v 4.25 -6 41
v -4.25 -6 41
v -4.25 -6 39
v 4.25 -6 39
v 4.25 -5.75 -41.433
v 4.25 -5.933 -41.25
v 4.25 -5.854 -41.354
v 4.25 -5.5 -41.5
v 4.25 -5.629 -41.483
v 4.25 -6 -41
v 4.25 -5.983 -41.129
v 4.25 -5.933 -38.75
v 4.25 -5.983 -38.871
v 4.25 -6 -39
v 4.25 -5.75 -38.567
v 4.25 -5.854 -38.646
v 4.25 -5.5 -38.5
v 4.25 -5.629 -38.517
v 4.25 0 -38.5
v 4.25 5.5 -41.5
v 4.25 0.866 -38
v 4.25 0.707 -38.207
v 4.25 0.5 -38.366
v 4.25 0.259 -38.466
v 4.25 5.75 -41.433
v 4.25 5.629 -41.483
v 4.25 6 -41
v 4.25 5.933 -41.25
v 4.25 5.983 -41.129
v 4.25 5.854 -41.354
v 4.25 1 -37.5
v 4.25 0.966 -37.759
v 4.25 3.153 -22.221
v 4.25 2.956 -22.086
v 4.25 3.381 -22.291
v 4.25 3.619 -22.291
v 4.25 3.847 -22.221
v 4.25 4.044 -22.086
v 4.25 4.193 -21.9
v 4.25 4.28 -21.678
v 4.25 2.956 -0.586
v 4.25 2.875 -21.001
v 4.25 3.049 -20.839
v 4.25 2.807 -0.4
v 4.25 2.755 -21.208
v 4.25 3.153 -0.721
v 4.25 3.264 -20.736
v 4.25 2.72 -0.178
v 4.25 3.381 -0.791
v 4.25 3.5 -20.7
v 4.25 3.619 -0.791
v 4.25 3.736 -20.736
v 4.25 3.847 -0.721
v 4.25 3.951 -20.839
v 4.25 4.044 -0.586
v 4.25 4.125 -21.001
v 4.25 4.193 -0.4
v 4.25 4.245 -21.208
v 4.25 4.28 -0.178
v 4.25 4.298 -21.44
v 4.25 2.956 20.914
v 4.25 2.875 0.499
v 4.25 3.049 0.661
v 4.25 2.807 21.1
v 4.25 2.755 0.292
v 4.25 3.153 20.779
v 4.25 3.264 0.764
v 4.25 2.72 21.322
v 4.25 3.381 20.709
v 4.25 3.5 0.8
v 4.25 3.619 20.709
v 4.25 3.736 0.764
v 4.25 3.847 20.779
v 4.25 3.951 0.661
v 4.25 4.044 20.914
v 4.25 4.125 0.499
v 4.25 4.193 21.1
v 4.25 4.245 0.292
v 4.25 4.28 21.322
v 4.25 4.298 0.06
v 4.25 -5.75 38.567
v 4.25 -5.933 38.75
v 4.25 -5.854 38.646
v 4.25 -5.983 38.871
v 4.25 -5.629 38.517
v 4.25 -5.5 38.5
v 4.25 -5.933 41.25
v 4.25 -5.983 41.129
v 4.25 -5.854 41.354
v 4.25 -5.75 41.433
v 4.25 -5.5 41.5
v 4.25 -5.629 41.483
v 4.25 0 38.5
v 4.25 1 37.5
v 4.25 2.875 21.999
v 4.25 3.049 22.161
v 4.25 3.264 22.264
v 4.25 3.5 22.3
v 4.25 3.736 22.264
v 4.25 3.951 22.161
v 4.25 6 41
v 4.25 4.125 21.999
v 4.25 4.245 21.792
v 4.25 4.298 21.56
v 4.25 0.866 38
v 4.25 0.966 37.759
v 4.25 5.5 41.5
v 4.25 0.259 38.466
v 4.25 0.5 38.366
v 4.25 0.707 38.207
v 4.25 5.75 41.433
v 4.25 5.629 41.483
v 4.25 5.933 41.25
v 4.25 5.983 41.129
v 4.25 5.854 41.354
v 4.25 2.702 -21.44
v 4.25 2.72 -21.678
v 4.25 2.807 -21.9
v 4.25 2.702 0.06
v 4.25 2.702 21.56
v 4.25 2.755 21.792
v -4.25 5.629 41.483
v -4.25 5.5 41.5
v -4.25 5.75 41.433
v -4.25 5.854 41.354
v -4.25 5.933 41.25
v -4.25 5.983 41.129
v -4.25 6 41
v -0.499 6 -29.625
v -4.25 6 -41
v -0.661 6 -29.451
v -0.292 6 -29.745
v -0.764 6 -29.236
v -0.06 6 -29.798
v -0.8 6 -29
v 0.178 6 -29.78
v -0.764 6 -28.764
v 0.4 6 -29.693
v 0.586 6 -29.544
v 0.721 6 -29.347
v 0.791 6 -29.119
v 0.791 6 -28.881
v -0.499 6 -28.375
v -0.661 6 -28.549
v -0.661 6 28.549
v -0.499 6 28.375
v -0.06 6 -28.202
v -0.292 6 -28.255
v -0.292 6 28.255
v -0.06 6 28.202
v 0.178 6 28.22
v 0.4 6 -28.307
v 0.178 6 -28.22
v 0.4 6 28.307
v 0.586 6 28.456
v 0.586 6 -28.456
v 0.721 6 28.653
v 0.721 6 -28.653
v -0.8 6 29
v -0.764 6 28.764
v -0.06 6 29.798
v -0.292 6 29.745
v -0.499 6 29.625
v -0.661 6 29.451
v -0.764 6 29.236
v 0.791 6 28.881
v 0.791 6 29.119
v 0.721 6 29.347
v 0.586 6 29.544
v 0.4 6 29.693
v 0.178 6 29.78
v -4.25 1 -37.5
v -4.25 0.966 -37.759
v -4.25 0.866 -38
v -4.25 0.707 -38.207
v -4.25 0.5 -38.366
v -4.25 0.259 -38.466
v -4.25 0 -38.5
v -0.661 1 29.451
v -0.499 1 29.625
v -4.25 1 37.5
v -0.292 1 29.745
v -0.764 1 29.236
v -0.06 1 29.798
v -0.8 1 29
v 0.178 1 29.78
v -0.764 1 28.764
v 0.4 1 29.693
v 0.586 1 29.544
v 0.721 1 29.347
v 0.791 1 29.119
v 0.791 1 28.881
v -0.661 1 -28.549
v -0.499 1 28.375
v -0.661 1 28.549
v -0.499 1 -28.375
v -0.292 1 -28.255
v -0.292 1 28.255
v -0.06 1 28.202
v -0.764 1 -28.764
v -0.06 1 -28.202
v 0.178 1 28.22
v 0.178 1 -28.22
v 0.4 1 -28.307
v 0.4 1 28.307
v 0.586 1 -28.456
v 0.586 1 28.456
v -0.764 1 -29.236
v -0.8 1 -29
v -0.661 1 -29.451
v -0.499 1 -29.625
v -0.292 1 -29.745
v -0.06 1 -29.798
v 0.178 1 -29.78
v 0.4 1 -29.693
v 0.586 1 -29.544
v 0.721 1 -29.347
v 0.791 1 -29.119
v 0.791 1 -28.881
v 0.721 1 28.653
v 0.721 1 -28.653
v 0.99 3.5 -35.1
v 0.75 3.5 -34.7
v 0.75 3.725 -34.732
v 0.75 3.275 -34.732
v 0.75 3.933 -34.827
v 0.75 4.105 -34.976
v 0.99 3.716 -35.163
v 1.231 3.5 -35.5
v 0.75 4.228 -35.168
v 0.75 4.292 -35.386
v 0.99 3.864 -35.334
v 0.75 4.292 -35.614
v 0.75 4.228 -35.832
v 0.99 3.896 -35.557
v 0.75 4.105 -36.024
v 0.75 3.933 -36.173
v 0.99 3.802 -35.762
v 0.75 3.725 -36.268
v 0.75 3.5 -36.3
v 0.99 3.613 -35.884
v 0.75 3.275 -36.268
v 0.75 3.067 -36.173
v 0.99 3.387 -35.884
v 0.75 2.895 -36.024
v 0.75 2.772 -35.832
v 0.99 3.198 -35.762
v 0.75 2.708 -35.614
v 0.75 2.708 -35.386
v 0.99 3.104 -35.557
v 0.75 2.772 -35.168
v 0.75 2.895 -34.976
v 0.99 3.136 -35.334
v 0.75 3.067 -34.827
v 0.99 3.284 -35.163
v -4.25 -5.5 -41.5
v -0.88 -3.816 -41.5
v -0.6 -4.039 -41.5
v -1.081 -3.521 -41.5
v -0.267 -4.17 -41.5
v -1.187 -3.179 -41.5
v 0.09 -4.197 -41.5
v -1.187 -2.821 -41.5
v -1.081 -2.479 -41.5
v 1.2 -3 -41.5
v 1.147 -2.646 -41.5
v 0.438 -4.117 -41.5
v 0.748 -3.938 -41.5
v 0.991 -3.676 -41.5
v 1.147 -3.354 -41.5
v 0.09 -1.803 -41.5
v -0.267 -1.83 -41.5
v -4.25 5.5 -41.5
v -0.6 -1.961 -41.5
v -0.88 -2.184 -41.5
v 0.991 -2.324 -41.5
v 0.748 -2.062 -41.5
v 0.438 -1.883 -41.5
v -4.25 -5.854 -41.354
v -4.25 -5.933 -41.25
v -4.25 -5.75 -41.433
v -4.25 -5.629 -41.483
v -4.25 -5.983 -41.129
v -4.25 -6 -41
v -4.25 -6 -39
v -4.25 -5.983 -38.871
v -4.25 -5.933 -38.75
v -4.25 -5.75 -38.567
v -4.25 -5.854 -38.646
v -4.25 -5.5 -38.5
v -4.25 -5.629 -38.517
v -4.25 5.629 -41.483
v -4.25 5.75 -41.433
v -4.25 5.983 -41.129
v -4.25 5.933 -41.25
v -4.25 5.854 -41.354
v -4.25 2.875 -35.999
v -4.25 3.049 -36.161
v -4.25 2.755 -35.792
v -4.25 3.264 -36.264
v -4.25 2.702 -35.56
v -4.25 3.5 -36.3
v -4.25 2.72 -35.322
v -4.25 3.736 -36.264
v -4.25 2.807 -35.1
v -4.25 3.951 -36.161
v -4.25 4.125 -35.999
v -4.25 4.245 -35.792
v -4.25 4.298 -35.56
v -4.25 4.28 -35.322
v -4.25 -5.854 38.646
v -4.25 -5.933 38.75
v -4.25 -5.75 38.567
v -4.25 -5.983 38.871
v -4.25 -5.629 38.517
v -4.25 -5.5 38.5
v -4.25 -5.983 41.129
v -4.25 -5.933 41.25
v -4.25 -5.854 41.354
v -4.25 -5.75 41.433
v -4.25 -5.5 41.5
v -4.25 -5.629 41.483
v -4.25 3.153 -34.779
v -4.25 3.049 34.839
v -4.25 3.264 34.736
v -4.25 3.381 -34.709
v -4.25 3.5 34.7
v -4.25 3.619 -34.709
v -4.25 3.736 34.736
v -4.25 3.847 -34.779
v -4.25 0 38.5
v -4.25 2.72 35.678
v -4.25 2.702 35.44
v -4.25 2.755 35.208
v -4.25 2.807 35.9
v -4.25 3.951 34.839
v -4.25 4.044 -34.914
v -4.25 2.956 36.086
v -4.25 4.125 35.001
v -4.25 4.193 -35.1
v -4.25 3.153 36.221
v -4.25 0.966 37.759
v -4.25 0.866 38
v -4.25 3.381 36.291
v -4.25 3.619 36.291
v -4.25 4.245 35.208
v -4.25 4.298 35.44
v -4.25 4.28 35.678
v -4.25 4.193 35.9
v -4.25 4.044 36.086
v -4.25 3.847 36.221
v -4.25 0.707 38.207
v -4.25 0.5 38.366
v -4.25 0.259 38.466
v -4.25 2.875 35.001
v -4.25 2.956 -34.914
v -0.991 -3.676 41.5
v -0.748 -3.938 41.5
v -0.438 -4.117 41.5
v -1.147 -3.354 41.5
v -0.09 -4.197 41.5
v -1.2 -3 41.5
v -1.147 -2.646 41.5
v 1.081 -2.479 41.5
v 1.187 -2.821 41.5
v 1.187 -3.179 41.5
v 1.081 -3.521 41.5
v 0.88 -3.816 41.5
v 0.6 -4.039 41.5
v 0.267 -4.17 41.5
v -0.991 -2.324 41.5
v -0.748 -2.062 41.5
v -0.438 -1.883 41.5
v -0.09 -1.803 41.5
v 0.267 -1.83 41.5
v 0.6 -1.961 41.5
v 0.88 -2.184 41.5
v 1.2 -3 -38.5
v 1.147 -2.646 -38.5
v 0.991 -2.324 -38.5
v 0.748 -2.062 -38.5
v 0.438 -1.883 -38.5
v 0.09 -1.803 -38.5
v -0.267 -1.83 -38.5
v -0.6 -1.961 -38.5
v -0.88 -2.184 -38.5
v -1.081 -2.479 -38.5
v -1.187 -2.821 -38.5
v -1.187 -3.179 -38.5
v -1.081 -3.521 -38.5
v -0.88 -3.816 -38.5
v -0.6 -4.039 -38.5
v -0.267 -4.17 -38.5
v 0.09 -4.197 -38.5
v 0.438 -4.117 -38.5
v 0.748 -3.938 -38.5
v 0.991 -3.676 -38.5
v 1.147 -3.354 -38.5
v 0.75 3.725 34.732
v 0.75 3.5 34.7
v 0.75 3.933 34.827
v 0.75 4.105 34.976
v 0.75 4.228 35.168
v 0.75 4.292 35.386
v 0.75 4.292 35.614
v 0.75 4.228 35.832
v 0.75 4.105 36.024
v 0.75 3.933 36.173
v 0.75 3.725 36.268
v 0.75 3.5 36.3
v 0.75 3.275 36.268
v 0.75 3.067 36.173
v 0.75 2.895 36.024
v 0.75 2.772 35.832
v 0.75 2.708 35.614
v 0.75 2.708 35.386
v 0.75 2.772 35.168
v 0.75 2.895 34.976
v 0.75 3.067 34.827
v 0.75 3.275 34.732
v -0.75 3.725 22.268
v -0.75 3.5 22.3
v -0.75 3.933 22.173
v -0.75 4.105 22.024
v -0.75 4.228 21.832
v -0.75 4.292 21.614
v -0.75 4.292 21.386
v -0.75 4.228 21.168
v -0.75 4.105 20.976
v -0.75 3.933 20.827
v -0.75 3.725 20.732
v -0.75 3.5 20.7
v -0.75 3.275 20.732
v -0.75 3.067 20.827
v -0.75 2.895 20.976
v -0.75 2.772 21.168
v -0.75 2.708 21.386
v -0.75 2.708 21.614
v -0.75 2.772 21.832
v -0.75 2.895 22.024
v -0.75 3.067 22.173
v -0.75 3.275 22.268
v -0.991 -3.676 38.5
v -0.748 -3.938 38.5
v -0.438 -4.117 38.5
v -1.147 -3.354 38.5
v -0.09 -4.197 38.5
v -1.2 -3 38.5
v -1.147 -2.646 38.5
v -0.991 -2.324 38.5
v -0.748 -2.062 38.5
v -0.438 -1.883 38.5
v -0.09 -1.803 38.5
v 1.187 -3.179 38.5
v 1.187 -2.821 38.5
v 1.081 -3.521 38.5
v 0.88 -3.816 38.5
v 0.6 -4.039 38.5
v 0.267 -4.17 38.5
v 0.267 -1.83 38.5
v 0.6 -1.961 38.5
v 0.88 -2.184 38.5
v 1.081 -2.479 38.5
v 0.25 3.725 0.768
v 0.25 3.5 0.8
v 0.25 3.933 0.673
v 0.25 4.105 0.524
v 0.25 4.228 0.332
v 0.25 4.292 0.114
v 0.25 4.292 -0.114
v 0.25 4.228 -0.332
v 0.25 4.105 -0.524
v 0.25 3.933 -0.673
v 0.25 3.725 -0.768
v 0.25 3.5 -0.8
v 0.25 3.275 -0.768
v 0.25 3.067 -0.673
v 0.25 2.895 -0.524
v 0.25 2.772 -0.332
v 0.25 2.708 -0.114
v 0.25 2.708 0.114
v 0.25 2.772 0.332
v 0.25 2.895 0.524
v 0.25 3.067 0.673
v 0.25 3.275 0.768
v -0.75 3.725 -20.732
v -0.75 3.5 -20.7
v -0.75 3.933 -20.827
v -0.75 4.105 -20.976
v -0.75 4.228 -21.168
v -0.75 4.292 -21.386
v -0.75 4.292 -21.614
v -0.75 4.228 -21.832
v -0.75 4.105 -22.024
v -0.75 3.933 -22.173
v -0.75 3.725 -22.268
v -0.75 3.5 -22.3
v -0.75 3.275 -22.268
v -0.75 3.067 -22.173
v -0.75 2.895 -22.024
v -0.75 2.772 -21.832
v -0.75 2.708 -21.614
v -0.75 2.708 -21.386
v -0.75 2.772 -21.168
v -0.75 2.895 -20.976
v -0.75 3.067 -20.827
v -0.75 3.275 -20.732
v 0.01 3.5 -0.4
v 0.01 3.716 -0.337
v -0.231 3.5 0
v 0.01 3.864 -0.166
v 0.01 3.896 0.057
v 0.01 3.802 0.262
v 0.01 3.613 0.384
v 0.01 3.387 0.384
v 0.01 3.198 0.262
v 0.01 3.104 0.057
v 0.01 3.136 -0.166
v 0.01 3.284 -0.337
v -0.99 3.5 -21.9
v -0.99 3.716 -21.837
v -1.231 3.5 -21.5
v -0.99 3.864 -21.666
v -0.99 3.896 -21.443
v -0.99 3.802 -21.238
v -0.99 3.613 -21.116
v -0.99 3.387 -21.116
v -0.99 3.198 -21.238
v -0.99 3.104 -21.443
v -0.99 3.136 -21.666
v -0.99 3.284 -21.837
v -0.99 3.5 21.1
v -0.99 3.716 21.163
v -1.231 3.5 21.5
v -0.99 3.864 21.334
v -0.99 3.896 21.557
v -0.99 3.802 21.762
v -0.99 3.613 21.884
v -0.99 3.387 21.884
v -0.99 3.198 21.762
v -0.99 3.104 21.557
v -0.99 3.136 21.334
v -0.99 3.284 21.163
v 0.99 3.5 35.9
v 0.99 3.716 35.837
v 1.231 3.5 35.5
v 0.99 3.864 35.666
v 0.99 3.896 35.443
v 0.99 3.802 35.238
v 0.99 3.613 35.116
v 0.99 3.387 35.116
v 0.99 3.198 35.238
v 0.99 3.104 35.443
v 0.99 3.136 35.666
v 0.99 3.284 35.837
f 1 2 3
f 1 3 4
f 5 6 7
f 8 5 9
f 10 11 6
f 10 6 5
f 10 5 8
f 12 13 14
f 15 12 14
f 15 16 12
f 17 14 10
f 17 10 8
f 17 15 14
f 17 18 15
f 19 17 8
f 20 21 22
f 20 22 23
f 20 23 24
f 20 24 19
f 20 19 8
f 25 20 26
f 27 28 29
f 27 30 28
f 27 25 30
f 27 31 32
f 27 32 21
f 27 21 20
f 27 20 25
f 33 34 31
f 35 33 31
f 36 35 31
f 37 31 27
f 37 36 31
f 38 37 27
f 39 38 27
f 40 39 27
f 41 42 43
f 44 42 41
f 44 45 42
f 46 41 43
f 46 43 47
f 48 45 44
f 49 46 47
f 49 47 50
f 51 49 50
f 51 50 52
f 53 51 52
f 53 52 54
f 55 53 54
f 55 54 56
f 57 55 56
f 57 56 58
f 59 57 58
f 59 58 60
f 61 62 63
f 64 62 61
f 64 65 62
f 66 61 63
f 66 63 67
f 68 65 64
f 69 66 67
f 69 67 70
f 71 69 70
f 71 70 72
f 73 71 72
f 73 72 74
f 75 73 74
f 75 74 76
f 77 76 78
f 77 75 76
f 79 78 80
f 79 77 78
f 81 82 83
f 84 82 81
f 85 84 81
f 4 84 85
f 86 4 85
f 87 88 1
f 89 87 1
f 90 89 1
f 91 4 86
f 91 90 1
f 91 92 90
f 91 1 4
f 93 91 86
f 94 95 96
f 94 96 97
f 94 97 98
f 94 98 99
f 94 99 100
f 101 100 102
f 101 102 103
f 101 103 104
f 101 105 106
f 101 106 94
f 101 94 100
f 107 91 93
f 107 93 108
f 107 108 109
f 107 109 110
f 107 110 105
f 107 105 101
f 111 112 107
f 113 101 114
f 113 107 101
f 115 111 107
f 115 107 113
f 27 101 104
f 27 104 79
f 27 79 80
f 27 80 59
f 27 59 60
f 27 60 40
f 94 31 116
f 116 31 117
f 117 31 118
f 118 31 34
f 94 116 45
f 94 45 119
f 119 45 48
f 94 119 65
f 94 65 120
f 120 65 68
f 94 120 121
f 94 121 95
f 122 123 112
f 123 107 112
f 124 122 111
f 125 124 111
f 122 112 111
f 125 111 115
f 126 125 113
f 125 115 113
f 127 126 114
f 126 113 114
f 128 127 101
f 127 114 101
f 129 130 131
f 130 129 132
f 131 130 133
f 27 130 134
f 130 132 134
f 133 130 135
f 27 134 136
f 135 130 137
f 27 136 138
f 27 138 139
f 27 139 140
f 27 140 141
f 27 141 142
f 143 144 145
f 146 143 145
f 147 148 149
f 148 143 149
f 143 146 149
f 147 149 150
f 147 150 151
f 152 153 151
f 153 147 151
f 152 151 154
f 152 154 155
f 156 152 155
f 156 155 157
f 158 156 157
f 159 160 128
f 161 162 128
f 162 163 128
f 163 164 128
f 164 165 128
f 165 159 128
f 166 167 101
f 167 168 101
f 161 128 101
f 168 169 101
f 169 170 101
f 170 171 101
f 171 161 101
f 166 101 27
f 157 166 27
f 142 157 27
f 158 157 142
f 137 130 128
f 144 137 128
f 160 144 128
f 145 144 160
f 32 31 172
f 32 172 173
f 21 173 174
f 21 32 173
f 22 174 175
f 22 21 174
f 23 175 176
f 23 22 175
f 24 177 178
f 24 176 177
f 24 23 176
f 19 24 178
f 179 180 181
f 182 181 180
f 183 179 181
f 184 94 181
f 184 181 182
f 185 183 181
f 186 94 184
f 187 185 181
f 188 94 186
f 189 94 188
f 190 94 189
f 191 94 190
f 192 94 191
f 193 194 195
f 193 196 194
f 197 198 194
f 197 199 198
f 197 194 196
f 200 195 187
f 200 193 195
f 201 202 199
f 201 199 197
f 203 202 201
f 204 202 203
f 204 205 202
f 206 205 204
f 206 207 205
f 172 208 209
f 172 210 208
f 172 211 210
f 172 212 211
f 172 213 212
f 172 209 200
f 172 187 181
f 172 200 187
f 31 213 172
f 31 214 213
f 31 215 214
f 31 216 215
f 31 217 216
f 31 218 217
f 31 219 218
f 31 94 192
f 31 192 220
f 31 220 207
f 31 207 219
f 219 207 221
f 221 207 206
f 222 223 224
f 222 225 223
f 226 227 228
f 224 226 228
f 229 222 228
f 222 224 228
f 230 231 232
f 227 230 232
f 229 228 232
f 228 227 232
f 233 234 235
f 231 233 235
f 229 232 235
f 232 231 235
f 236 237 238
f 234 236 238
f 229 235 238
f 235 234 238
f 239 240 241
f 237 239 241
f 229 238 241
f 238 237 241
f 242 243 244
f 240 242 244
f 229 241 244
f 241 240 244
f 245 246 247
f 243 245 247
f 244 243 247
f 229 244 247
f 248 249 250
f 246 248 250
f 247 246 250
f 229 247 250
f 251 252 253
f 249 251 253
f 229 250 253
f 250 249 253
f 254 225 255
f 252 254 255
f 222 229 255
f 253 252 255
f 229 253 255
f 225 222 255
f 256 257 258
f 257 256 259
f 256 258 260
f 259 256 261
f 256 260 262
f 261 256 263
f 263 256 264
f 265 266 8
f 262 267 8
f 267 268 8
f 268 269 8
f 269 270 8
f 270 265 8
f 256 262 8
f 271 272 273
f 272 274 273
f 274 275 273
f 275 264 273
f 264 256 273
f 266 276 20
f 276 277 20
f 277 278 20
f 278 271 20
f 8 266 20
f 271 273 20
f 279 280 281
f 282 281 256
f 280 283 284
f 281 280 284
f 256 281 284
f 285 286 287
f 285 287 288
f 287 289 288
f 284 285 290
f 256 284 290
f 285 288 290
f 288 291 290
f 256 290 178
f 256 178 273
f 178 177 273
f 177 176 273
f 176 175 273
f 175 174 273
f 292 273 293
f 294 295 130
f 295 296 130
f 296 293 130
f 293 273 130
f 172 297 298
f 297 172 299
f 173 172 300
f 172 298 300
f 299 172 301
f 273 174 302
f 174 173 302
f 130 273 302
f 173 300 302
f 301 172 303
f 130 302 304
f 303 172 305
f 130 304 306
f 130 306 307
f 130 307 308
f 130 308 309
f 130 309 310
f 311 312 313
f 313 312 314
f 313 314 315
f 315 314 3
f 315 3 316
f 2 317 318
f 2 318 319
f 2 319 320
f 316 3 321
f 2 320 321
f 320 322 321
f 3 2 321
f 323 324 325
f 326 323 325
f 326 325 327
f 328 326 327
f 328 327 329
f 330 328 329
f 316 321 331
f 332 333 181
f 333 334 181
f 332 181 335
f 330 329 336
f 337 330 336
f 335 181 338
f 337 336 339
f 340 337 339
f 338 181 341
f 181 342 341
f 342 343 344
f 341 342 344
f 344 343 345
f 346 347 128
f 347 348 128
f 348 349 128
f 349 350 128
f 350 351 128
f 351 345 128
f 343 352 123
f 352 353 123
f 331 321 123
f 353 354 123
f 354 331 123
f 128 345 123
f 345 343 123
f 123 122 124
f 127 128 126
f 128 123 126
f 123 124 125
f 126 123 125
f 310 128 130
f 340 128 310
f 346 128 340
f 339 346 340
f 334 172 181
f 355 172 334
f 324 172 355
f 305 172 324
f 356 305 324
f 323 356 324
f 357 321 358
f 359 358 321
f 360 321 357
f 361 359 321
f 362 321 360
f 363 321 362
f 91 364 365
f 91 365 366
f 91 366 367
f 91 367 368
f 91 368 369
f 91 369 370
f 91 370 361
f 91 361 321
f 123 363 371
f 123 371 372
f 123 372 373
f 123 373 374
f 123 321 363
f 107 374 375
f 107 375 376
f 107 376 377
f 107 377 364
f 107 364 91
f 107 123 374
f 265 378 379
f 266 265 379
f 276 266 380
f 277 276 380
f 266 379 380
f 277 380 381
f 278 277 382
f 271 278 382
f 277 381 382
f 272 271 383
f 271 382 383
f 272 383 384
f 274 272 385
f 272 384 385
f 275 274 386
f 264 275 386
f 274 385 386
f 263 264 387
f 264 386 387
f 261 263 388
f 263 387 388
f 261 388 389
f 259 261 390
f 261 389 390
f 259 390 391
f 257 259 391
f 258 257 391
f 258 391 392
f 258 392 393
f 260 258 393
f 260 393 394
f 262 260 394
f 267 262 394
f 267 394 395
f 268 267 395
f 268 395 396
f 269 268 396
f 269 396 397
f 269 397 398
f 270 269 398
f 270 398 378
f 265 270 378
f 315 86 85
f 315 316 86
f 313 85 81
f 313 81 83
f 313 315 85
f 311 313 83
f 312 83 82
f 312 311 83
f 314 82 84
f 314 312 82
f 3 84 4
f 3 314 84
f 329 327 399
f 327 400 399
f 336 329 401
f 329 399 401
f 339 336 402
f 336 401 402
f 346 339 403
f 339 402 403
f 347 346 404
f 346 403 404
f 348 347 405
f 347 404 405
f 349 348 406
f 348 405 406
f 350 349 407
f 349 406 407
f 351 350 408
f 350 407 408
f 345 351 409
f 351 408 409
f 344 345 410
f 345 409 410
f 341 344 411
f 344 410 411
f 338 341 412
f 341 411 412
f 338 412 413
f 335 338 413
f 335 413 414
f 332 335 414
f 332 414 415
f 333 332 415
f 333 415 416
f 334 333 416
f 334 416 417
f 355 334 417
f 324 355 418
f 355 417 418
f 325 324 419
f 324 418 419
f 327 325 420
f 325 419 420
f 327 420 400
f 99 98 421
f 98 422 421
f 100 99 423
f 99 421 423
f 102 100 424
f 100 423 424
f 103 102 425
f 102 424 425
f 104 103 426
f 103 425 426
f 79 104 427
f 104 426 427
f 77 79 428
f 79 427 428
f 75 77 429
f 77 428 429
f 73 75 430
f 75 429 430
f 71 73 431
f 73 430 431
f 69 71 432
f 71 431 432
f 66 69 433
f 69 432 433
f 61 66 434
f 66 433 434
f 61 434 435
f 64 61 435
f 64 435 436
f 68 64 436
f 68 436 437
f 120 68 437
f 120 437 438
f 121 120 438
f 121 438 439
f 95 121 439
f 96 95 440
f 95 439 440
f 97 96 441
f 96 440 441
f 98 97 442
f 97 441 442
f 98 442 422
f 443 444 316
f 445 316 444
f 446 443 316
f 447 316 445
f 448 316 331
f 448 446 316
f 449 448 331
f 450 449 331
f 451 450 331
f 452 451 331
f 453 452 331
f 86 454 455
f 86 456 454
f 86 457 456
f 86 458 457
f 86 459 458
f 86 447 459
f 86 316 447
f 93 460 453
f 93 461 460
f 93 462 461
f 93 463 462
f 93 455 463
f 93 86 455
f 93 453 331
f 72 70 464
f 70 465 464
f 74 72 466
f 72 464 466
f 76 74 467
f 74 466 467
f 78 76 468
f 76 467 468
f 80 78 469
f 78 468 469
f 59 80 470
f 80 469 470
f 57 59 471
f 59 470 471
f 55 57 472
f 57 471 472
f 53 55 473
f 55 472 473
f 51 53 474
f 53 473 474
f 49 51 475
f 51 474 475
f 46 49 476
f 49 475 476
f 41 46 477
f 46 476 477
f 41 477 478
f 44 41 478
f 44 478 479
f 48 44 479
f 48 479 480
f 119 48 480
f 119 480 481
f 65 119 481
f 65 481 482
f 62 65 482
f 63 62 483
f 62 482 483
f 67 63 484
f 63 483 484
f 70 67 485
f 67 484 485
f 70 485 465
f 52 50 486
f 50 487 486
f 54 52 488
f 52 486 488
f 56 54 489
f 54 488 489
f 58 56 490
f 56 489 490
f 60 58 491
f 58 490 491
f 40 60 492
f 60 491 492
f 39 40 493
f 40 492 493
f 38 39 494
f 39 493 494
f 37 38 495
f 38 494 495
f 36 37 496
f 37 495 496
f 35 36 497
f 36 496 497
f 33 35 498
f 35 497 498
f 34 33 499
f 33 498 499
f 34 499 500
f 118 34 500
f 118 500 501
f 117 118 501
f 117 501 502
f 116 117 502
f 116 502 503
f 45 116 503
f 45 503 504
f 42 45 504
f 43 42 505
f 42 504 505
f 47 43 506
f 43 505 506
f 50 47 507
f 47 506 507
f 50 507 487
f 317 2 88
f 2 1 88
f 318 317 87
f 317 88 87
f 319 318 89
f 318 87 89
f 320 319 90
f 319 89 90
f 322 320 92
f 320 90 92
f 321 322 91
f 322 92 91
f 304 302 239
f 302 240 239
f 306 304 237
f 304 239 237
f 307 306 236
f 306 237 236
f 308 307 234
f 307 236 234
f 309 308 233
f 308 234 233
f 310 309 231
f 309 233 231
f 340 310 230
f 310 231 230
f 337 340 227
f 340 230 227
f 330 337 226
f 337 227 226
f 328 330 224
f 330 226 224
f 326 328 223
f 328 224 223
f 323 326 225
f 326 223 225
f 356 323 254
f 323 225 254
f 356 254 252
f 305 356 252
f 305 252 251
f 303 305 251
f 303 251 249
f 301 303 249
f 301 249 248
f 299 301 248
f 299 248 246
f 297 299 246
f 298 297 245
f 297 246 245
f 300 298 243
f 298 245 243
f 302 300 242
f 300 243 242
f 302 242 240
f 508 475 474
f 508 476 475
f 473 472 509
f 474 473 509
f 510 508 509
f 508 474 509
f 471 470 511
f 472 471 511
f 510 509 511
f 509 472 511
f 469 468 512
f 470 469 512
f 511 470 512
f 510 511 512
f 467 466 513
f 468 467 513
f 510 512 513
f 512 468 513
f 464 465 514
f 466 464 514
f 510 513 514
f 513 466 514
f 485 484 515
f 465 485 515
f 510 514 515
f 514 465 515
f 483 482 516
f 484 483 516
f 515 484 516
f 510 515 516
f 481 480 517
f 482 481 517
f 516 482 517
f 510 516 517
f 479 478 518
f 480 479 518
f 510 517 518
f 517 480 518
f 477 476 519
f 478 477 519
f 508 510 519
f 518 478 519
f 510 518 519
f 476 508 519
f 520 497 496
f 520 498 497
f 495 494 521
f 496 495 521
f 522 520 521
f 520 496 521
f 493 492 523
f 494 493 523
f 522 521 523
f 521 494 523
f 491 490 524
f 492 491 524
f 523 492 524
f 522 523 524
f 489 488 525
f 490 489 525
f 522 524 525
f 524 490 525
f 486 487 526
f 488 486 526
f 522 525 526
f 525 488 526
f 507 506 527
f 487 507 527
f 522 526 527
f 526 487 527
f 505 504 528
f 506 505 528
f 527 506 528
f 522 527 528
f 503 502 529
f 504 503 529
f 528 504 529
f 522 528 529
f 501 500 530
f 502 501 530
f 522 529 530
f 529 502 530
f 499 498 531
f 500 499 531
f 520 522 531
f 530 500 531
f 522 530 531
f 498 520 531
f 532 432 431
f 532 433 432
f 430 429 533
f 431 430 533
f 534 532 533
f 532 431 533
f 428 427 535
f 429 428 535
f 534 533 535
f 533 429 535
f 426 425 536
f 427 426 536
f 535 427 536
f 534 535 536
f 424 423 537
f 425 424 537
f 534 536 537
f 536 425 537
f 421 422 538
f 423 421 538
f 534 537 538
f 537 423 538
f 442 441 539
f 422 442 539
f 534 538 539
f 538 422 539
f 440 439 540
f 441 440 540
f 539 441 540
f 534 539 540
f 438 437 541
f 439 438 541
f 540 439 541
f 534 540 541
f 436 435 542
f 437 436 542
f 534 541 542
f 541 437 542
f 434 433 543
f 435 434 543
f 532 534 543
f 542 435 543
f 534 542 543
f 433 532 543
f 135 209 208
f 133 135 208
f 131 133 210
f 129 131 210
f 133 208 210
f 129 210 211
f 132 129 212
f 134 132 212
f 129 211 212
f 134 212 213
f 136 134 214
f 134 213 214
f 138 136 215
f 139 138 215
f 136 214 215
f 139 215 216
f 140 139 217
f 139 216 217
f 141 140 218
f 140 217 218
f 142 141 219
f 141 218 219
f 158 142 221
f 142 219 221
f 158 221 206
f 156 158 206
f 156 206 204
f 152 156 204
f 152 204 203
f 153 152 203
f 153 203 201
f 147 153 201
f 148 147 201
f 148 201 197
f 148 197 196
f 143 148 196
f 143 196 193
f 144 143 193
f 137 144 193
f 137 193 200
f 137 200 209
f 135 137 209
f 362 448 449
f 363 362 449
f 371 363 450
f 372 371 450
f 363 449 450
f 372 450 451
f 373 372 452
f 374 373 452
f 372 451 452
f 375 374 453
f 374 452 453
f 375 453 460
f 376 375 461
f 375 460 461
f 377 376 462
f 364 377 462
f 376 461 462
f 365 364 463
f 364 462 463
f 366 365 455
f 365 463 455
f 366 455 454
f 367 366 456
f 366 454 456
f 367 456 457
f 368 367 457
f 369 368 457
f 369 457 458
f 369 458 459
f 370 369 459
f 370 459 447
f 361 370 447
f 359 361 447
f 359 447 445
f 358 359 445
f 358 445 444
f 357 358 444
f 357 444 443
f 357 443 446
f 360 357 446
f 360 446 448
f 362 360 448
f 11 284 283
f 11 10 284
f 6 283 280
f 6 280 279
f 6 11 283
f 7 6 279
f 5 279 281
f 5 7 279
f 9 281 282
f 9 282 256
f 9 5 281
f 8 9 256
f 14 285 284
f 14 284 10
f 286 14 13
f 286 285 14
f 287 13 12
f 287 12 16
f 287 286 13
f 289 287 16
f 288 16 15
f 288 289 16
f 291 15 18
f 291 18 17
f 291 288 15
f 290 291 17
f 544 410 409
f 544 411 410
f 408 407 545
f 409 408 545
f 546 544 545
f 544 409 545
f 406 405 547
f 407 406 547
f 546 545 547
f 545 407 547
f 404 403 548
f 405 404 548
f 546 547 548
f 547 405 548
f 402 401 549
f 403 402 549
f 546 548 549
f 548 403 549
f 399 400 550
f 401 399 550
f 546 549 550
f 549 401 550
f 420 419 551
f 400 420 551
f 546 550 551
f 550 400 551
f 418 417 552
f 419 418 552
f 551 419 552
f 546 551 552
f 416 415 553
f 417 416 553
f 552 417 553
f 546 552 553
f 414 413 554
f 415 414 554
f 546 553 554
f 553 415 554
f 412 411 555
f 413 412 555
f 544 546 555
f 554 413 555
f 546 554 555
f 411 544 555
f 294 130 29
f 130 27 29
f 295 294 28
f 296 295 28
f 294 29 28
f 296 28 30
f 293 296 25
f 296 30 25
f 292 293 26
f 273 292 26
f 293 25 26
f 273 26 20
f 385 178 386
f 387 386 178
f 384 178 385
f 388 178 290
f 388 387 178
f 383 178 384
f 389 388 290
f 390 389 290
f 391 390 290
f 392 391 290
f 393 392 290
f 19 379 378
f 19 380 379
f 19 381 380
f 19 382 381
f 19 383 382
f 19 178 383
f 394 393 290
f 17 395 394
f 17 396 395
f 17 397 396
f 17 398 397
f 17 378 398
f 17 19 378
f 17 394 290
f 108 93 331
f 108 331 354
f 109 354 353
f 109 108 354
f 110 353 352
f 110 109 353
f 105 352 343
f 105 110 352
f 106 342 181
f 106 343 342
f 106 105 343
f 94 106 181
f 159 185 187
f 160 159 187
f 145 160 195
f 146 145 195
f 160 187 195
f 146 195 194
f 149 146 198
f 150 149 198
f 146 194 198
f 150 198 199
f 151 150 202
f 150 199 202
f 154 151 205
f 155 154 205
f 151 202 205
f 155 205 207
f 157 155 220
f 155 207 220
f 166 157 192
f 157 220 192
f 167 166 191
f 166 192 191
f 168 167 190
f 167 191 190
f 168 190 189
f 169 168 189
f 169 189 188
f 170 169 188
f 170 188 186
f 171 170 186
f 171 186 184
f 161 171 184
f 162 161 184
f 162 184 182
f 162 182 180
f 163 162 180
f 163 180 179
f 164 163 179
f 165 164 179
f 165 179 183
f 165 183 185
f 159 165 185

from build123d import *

# Parameters (mm, degrees)
SKETCH1_W           = 8.5
SKETCH1_H           = 12
BOSS_EXTRUDE1_DEPTH = 41.5
CUT_EXTRUDE1_DEPTH  = 43.784342931
FILLET1_R           = 0.5
M2_HOLE1_R_D        = 1.6
M2_HOLE1_R_DEPTH    = 5
M2_HOLE1_R_TIP      = 0.480688495
M2_HOLE2_T_D        = 1.6
M2_HOLE2_T_DEPTH    = 4
M2_HOLE2_T_TIP      = 0.480688495
M2_HOLE3_U_D        = 2.4
M2_HOLE3_U_DEPTH    = 10
M2_HOLE3_U_TIP      = 0.721032743
M2_HOLE4_V_D        = 1.6
M2_HOLE5_W_D        = 1.6
M2_HOLE5_W_DEPTH    = 5
M2_HOLE5_W_TIP      = 0.480688495
M2_HOLE6_Y_D        = 2.4
M2_HOLE6_Y_DEPTH    = 10
M2_HOLE6_Y_TIP      = 0.721032743


with BuildPart() as part:
    # Sketch1 → Boss-Extrude1 (new, symmetric)
    with BuildSketch(Plane.XY):
        Rectangle(SKETCH1_W, SKETCH1_H)
    extrude(amount=BOSS_EXTRUDE1_DEPTH, both=True)

    # Sketch2 → Cut-Extrude1 (cut, through all)
    with BuildSketch(Plane(origin=(4.25, 0, 0), x_dir=(0, 0, -1), z_dir=(1, 0, 0))):
        with BuildLine():
            Line((-37.5, 1), (37.5, 1))
            ThreePointArc((37.5, 1), (38.207106781, 0.707106781), (38.5, 0))
            Line((38.5, 0), (38.5, -6))
            Line((38.5, -6), (-38.5, -6))
            Line((-38.5, -6), (-38.5, 0))
            ThreePointArc((-38.5, 0), (-38.207106781, 0.707106781), (-37.5, 1))
        make_face()
    extrude(amount=-CUT_EXTRUDE1_DEPTH, mode=Mode.SUBTRACT)

    # Fillet1
    fillet1_edges = [part.edges().sort_by_distance(p)[0] for p in [
        (0, -6, 41.5),
        (0, -6, -38.5),
        (0, -6, 38.5),
        (0, -6, -41.5),
        (0, 6, -41.5),
        (0, 6, 41.5),
    ]]
    fillet(fillet1_edges, radius=FILLET1_R)

    # M2 Hole1-R
    with Locations(Plane(origin=(4.25, 0, 0), x_dir=(0, 0, -1), z_dir=(1, 0, 0))):
        with Locations((21.5, 3.5), (-21.5, 3.5)):
            Hole(M2_HOLE1_R_D / 2, depth=M2_HOLE1_R_DEPTH)
            with Locations((0, 0, -(M2_HOLE1_R_DEPTH + M2_HOLE1_R_TIP / 2))):  # 118° drill point
                Cone(0, M2_HOLE1_R_D / 2, M2_HOLE1_R_TIP, mode=Mode.SUBTRACT)

    # M2 Hole2-T
    with Locations(Plane(origin=(4.25, 0, 0), x_dir=(0, 0, -1), z_dir=(1, 0, 0))):
        with Locations((0, 3.5)):
            Hole(M2_HOLE2_T_D / 2, depth=M2_HOLE2_T_DEPTH)
            with Locations((0, 0, -(M2_HOLE2_T_DEPTH + M2_HOLE2_T_TIP / 2))):  # 118° drill point
                Cone(0, M2_HOLE2_T_D / 2, M2_HOLE2_T_TIP, mode=Mode.SUBTRACT)

    # M2 Hole3-U
    with Locations(Plane.XY.offset(41.5)):
        with Locations((0, -3)):
            Hole(M2_HOLE3_U_D / 2, depth=M2_HOLE3_U_DEPTH)
            with Locations((0, 0, -(M2_HOLE3_U_DEPTH + M2_HOLE3_U_TIP / 2))):  # 118° drill point
                Cone(0, M2_HOLE3_U_D / 2, M2_HOLE3_U_TIP, mode=Mode.SUBTRACT)

    # M2 Hole4-V (through all)
    with Locations(Plane(origin=(0, 6, 0), x_dir=(1, 0, 0), z_dir=(0, 1, 0))):
        with Locations((0, 29), (0, -29)):
            Hole(M2_HOLE4_V_D / 2)

    # M2 Hole5-W
    with Locations(Plane.ZY.offset(4.25)):
        with Locations((-35.5, 3.5), (35.5, 3.5)):
            Hole(M2_HOLE5_W_D / 2, depth=M2_HOLE5_W_DEPTH)
            with Locations((0, 0, -(M2_HOLE5_W_DEPTH + M2_HOLE5_W_TIP / 2))):  # 118° drill point
                Cone(0, M2_HOLE5_W_D / 2, M2_HOLE5_W_TIP, mode=Mode.SUBTRACT)

    # M2 Hole6-Y
    with Locations(Plane(origin=(0, 0, -41.5), x_dir=(-1, 0, 0), z_dir=(0, 0, -1))):
        with Locations((0, -3)):
            Hole(M2_HOLE6_Y_D / 2, depth=M2_HOLE6_Y_DEPTH)
            with Locations((0, 0, -(M2_HOLE6_Y_DEPTH + M2_HOLE6_Y_TIP / 2))):  # 118° drill point
                Cone(0, M2_HOLE6_Y_D / 2, M2_HOLE6_Y_TIP, mode=Mode.SUBTRACT)


solid = part.part
